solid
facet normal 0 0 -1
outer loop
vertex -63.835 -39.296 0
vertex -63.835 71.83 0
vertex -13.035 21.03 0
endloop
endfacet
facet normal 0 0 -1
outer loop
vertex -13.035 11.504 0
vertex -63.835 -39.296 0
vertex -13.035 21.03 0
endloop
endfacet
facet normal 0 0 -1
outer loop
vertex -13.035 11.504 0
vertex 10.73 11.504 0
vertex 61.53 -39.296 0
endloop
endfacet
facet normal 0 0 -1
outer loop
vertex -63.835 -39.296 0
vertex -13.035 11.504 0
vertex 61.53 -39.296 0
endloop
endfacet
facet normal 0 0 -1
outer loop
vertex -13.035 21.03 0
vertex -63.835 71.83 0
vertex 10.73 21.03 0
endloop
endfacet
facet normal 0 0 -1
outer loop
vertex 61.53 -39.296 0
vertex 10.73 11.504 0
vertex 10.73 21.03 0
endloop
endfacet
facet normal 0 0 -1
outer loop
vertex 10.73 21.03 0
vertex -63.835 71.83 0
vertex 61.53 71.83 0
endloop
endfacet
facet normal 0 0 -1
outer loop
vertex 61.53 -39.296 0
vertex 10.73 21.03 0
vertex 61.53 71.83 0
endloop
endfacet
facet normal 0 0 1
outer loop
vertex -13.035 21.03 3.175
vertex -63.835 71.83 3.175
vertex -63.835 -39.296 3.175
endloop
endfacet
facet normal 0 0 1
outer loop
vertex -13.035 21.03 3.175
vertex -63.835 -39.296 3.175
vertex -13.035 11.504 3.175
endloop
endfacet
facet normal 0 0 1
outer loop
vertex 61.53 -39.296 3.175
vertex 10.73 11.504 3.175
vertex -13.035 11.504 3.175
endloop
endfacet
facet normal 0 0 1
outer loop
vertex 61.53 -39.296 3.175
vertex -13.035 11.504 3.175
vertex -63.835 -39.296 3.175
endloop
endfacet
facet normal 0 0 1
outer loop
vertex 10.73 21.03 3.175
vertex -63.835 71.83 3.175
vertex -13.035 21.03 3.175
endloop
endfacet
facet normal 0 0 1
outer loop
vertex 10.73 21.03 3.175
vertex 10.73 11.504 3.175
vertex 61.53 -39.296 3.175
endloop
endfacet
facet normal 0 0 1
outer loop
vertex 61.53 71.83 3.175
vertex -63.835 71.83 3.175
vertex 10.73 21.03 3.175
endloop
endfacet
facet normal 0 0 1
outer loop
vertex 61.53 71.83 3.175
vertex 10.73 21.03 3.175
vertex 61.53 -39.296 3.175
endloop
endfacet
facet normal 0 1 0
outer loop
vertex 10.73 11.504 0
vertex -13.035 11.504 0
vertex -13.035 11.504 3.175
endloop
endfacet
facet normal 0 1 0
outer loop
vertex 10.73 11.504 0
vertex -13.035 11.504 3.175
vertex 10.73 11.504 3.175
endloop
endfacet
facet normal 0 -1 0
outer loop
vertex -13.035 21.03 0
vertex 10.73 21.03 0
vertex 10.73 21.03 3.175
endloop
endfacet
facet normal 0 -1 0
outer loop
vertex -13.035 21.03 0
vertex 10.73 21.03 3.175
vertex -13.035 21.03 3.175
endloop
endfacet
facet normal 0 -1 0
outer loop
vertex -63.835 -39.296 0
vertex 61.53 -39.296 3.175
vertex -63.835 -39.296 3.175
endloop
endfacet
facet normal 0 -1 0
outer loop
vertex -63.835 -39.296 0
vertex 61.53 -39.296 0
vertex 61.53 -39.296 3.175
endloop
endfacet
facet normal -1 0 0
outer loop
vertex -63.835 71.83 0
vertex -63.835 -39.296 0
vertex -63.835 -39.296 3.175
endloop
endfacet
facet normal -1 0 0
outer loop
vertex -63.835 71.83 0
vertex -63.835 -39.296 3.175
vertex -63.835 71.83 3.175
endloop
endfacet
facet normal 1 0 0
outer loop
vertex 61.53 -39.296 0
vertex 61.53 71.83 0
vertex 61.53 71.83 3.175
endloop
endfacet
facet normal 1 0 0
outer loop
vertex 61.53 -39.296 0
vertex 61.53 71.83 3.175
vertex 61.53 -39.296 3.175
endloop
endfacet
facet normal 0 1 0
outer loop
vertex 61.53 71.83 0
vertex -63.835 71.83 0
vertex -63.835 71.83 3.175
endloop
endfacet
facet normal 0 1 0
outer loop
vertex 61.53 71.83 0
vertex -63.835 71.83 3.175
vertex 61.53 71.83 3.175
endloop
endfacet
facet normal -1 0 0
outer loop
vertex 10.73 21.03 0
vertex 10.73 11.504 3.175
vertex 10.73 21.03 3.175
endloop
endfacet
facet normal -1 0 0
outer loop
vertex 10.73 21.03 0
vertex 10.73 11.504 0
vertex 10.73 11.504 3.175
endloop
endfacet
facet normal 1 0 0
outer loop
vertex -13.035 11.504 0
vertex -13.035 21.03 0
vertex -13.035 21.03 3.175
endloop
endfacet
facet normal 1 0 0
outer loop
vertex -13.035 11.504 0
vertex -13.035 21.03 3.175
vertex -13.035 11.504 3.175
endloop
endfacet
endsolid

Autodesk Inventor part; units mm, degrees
ref_plane "YZ Plane" through (0, 0, 0) normal (1, 0, 0) x (0, 1, 0)
ref_plane "XZ Plane" through (0, 0, 0) normal (0, 1, 0) x (-1, 0, 0)
ref_plane "XY Plane" through (0, 0, 0) normal (0, 0, 1) x (1, 0, 0)
sketch "Sketch1" plane through (0, 0, 0) normal (0, 0, 1) x (1, 0, 0)
  line L0 (-14.8528, 1.9795) -> (12.8586, 1.9795) construction
  line L1 (12.8586, 1.9795) -> (12.8586, -13.7685) construction
  line L2 (12.8586, -13.7685) -> (-14.8528, -13.7685) construction
  line L3 (-14.8528, -13.7685) -> (-14.8528, 1.9795) construction
  line L4 (5.9975, 1.9795) -> (8.6518, 1.9795) construction
  line L5 (8.6518, 1.9795) -> (8.6518, 4.3671) construction
  line L6 (8.6518, 4.3671) -> (5.9975, 4.3671) construction
  line L7 (5.9975, 4.3671) -> (5.9975, 1.9795) construction
  line L8 (-32.4421, 11.5045) -> (30.2817, 11.5045) construction
  line L9 (-32.4421, 8.3295) -> (29.9988, 8.3295) construction
  line L10 (-13.9321, 13.8921) -> (17.834, 13.8921) construction
  line L11 (-1.8734, -10.8674) -> (-1.8734, -21.0274) construction
  line L12 (-2.2544, -23.9285) -> (-2.2544, -13.7685) construction
  line L13 (-14.8528, -9.4505) -> (-21.958, -9.4505) construction
  line L14 (-21.958, -9.8315) -> (-14.0038, -9.8315) construction
  line L15 (-14.8528, 1.9795) -> (12.6787, 5.1322) construction
  arc A0 (9.1943, 9.241) -> (-14.8528, 1.9795) centre (-1.1526, 0.0577) ccw construction
  circle A1 centre (-10.8004, 5.3198) radius 0.889 construction
  line L16 (-13.0354, 11.5045) -> (-13.0354, 8.3295) construction
  line L17 (10.7302, 11.5045) -> (10.7302, 8.3295) construction
  line L18 (-12.2416, 8.3295) -> (-12.2416, 11.5045) construction
  line L19 (9.9365, 8.3295) -> (9.9365, 11.5045) construction
  line L20 (13.1115, 8.3295) -> (11.9301, 8.1942) construction
  line L21 (11.9301, 8.1942) -> (12.3229, 8.2392) construction
  line L22 (13.377, 6.0111) -> (13.2018, 7.5409) construction
  line L23 (-13.2979, 6.6819) -> (-11.5809, 5.7454) construction
  line L24 (-10.4753, 2.4807) -> (-10.6993, 4.4365) construction
  arc A2 (9.1943, 9.241) -> (11.9301, 8.1942) centre (11.5689, 11.3486) ccw construction
  arc A3 (13.2018, 7.5409) -> (12.3229, 8.2392) centre (12.4132, 7.4506) ccw construction
  arc A4 (12.6787, 5.1322) -> (13.377, 6.0111) centre (12.5884, 5.9208) ccw construction
  circle A5 centre (-11.9953, -0.878) radius 1.5875 construction
  line L25 (-13.5828, 0.7095) -> (-5.6621, 0.7095) construction
  line L26 (-13.5828, -2.3385) -> (-13.5828, 0.7095) construction
  circle A6 centre (10.0011, -10.911) radius 1.5875 construction
  line L27 (11.5886, -9.3235) -> (11.5886, -12.4985) construction
  line L28 (11.5886, -12.4985) -> (4.7585, -12.4985) construction
  line L29 (-13.0354, 11.5045) -> (10.7302, 11.5045)
  line L30 (10.7302, 11.5045) -> (10.7302, 21.0295)
  line L31 (10.7302, 21.0295) -> (-13.0354, 21.0295)
  line L32 (-13.0354, 21.0295) -> (-13.0354, 11.5045)
  line L33 (-63.8354, 71.8295) -> (61.5302, 71.8295)
  line L34 (61.5302, 71.8295) -> (61.5302, -39.2955)
  line L35 (61.5302, -39.2955) -> (-63.8354, -39.2955)
  line L36 (-63.8354, -39.2955) -> (-63.8354, 71.8295)
  point P0 (0, 0)
  dimension "d0" = 27.7114
  dimension "d1" = 15.748
  dimension "d2" = 2.6543
  dimension "buttonHeight" = 2.3876
  dimension "d4" = 3.175
  dimension "d5" = 2.3876
  dimension "buttonInset" = 4.2068
  dimension "d10" = 14.732
  dimension "d11" = 0.381
  dimension "d12" = 10.16
  dimension "d14" = 11.43
  dimension "d15" = 0.381
  dimension "d16" = 6.35
  dimension "nail" = 1.778
  dimension "clearance" = 0.7937
  dimension "d32" = 0.7937
  dimension "cutOutLength" = 23.7656
  dimension "d34" = 2.3813
  dimension "d35" = 1.9558
  dimension "d36" = 1.9558
  dimension "d37" = 3.175
  dimension "d38" = 0.7937
  dimension "holeDistanceFromSurface" = 3.0097
  dimension "holeDistanceFromEnd" = 4.0524
  dimension "d52" = 3.175
  dimension "d53" = 1.27
  dimension "d54" = 1.27
  dimension "d55" = 3.175
  dimension "d56" = 1.27
  dimension "d57" = 1.27
  dimension "d60" = 9.525
  dimension "d63" = 50.8
  dimension "d64" = 50.8
  dimension "d65" = 50.8
  dimension "d66" = 50.8
extrude "Extrusion7" add sketch "Sketch1" along normal blind 3.175
equation "\"d5\" = buttonHeight"
equation "\"d32\" = clearance"
properties part number "Surface Switch Cutout"
